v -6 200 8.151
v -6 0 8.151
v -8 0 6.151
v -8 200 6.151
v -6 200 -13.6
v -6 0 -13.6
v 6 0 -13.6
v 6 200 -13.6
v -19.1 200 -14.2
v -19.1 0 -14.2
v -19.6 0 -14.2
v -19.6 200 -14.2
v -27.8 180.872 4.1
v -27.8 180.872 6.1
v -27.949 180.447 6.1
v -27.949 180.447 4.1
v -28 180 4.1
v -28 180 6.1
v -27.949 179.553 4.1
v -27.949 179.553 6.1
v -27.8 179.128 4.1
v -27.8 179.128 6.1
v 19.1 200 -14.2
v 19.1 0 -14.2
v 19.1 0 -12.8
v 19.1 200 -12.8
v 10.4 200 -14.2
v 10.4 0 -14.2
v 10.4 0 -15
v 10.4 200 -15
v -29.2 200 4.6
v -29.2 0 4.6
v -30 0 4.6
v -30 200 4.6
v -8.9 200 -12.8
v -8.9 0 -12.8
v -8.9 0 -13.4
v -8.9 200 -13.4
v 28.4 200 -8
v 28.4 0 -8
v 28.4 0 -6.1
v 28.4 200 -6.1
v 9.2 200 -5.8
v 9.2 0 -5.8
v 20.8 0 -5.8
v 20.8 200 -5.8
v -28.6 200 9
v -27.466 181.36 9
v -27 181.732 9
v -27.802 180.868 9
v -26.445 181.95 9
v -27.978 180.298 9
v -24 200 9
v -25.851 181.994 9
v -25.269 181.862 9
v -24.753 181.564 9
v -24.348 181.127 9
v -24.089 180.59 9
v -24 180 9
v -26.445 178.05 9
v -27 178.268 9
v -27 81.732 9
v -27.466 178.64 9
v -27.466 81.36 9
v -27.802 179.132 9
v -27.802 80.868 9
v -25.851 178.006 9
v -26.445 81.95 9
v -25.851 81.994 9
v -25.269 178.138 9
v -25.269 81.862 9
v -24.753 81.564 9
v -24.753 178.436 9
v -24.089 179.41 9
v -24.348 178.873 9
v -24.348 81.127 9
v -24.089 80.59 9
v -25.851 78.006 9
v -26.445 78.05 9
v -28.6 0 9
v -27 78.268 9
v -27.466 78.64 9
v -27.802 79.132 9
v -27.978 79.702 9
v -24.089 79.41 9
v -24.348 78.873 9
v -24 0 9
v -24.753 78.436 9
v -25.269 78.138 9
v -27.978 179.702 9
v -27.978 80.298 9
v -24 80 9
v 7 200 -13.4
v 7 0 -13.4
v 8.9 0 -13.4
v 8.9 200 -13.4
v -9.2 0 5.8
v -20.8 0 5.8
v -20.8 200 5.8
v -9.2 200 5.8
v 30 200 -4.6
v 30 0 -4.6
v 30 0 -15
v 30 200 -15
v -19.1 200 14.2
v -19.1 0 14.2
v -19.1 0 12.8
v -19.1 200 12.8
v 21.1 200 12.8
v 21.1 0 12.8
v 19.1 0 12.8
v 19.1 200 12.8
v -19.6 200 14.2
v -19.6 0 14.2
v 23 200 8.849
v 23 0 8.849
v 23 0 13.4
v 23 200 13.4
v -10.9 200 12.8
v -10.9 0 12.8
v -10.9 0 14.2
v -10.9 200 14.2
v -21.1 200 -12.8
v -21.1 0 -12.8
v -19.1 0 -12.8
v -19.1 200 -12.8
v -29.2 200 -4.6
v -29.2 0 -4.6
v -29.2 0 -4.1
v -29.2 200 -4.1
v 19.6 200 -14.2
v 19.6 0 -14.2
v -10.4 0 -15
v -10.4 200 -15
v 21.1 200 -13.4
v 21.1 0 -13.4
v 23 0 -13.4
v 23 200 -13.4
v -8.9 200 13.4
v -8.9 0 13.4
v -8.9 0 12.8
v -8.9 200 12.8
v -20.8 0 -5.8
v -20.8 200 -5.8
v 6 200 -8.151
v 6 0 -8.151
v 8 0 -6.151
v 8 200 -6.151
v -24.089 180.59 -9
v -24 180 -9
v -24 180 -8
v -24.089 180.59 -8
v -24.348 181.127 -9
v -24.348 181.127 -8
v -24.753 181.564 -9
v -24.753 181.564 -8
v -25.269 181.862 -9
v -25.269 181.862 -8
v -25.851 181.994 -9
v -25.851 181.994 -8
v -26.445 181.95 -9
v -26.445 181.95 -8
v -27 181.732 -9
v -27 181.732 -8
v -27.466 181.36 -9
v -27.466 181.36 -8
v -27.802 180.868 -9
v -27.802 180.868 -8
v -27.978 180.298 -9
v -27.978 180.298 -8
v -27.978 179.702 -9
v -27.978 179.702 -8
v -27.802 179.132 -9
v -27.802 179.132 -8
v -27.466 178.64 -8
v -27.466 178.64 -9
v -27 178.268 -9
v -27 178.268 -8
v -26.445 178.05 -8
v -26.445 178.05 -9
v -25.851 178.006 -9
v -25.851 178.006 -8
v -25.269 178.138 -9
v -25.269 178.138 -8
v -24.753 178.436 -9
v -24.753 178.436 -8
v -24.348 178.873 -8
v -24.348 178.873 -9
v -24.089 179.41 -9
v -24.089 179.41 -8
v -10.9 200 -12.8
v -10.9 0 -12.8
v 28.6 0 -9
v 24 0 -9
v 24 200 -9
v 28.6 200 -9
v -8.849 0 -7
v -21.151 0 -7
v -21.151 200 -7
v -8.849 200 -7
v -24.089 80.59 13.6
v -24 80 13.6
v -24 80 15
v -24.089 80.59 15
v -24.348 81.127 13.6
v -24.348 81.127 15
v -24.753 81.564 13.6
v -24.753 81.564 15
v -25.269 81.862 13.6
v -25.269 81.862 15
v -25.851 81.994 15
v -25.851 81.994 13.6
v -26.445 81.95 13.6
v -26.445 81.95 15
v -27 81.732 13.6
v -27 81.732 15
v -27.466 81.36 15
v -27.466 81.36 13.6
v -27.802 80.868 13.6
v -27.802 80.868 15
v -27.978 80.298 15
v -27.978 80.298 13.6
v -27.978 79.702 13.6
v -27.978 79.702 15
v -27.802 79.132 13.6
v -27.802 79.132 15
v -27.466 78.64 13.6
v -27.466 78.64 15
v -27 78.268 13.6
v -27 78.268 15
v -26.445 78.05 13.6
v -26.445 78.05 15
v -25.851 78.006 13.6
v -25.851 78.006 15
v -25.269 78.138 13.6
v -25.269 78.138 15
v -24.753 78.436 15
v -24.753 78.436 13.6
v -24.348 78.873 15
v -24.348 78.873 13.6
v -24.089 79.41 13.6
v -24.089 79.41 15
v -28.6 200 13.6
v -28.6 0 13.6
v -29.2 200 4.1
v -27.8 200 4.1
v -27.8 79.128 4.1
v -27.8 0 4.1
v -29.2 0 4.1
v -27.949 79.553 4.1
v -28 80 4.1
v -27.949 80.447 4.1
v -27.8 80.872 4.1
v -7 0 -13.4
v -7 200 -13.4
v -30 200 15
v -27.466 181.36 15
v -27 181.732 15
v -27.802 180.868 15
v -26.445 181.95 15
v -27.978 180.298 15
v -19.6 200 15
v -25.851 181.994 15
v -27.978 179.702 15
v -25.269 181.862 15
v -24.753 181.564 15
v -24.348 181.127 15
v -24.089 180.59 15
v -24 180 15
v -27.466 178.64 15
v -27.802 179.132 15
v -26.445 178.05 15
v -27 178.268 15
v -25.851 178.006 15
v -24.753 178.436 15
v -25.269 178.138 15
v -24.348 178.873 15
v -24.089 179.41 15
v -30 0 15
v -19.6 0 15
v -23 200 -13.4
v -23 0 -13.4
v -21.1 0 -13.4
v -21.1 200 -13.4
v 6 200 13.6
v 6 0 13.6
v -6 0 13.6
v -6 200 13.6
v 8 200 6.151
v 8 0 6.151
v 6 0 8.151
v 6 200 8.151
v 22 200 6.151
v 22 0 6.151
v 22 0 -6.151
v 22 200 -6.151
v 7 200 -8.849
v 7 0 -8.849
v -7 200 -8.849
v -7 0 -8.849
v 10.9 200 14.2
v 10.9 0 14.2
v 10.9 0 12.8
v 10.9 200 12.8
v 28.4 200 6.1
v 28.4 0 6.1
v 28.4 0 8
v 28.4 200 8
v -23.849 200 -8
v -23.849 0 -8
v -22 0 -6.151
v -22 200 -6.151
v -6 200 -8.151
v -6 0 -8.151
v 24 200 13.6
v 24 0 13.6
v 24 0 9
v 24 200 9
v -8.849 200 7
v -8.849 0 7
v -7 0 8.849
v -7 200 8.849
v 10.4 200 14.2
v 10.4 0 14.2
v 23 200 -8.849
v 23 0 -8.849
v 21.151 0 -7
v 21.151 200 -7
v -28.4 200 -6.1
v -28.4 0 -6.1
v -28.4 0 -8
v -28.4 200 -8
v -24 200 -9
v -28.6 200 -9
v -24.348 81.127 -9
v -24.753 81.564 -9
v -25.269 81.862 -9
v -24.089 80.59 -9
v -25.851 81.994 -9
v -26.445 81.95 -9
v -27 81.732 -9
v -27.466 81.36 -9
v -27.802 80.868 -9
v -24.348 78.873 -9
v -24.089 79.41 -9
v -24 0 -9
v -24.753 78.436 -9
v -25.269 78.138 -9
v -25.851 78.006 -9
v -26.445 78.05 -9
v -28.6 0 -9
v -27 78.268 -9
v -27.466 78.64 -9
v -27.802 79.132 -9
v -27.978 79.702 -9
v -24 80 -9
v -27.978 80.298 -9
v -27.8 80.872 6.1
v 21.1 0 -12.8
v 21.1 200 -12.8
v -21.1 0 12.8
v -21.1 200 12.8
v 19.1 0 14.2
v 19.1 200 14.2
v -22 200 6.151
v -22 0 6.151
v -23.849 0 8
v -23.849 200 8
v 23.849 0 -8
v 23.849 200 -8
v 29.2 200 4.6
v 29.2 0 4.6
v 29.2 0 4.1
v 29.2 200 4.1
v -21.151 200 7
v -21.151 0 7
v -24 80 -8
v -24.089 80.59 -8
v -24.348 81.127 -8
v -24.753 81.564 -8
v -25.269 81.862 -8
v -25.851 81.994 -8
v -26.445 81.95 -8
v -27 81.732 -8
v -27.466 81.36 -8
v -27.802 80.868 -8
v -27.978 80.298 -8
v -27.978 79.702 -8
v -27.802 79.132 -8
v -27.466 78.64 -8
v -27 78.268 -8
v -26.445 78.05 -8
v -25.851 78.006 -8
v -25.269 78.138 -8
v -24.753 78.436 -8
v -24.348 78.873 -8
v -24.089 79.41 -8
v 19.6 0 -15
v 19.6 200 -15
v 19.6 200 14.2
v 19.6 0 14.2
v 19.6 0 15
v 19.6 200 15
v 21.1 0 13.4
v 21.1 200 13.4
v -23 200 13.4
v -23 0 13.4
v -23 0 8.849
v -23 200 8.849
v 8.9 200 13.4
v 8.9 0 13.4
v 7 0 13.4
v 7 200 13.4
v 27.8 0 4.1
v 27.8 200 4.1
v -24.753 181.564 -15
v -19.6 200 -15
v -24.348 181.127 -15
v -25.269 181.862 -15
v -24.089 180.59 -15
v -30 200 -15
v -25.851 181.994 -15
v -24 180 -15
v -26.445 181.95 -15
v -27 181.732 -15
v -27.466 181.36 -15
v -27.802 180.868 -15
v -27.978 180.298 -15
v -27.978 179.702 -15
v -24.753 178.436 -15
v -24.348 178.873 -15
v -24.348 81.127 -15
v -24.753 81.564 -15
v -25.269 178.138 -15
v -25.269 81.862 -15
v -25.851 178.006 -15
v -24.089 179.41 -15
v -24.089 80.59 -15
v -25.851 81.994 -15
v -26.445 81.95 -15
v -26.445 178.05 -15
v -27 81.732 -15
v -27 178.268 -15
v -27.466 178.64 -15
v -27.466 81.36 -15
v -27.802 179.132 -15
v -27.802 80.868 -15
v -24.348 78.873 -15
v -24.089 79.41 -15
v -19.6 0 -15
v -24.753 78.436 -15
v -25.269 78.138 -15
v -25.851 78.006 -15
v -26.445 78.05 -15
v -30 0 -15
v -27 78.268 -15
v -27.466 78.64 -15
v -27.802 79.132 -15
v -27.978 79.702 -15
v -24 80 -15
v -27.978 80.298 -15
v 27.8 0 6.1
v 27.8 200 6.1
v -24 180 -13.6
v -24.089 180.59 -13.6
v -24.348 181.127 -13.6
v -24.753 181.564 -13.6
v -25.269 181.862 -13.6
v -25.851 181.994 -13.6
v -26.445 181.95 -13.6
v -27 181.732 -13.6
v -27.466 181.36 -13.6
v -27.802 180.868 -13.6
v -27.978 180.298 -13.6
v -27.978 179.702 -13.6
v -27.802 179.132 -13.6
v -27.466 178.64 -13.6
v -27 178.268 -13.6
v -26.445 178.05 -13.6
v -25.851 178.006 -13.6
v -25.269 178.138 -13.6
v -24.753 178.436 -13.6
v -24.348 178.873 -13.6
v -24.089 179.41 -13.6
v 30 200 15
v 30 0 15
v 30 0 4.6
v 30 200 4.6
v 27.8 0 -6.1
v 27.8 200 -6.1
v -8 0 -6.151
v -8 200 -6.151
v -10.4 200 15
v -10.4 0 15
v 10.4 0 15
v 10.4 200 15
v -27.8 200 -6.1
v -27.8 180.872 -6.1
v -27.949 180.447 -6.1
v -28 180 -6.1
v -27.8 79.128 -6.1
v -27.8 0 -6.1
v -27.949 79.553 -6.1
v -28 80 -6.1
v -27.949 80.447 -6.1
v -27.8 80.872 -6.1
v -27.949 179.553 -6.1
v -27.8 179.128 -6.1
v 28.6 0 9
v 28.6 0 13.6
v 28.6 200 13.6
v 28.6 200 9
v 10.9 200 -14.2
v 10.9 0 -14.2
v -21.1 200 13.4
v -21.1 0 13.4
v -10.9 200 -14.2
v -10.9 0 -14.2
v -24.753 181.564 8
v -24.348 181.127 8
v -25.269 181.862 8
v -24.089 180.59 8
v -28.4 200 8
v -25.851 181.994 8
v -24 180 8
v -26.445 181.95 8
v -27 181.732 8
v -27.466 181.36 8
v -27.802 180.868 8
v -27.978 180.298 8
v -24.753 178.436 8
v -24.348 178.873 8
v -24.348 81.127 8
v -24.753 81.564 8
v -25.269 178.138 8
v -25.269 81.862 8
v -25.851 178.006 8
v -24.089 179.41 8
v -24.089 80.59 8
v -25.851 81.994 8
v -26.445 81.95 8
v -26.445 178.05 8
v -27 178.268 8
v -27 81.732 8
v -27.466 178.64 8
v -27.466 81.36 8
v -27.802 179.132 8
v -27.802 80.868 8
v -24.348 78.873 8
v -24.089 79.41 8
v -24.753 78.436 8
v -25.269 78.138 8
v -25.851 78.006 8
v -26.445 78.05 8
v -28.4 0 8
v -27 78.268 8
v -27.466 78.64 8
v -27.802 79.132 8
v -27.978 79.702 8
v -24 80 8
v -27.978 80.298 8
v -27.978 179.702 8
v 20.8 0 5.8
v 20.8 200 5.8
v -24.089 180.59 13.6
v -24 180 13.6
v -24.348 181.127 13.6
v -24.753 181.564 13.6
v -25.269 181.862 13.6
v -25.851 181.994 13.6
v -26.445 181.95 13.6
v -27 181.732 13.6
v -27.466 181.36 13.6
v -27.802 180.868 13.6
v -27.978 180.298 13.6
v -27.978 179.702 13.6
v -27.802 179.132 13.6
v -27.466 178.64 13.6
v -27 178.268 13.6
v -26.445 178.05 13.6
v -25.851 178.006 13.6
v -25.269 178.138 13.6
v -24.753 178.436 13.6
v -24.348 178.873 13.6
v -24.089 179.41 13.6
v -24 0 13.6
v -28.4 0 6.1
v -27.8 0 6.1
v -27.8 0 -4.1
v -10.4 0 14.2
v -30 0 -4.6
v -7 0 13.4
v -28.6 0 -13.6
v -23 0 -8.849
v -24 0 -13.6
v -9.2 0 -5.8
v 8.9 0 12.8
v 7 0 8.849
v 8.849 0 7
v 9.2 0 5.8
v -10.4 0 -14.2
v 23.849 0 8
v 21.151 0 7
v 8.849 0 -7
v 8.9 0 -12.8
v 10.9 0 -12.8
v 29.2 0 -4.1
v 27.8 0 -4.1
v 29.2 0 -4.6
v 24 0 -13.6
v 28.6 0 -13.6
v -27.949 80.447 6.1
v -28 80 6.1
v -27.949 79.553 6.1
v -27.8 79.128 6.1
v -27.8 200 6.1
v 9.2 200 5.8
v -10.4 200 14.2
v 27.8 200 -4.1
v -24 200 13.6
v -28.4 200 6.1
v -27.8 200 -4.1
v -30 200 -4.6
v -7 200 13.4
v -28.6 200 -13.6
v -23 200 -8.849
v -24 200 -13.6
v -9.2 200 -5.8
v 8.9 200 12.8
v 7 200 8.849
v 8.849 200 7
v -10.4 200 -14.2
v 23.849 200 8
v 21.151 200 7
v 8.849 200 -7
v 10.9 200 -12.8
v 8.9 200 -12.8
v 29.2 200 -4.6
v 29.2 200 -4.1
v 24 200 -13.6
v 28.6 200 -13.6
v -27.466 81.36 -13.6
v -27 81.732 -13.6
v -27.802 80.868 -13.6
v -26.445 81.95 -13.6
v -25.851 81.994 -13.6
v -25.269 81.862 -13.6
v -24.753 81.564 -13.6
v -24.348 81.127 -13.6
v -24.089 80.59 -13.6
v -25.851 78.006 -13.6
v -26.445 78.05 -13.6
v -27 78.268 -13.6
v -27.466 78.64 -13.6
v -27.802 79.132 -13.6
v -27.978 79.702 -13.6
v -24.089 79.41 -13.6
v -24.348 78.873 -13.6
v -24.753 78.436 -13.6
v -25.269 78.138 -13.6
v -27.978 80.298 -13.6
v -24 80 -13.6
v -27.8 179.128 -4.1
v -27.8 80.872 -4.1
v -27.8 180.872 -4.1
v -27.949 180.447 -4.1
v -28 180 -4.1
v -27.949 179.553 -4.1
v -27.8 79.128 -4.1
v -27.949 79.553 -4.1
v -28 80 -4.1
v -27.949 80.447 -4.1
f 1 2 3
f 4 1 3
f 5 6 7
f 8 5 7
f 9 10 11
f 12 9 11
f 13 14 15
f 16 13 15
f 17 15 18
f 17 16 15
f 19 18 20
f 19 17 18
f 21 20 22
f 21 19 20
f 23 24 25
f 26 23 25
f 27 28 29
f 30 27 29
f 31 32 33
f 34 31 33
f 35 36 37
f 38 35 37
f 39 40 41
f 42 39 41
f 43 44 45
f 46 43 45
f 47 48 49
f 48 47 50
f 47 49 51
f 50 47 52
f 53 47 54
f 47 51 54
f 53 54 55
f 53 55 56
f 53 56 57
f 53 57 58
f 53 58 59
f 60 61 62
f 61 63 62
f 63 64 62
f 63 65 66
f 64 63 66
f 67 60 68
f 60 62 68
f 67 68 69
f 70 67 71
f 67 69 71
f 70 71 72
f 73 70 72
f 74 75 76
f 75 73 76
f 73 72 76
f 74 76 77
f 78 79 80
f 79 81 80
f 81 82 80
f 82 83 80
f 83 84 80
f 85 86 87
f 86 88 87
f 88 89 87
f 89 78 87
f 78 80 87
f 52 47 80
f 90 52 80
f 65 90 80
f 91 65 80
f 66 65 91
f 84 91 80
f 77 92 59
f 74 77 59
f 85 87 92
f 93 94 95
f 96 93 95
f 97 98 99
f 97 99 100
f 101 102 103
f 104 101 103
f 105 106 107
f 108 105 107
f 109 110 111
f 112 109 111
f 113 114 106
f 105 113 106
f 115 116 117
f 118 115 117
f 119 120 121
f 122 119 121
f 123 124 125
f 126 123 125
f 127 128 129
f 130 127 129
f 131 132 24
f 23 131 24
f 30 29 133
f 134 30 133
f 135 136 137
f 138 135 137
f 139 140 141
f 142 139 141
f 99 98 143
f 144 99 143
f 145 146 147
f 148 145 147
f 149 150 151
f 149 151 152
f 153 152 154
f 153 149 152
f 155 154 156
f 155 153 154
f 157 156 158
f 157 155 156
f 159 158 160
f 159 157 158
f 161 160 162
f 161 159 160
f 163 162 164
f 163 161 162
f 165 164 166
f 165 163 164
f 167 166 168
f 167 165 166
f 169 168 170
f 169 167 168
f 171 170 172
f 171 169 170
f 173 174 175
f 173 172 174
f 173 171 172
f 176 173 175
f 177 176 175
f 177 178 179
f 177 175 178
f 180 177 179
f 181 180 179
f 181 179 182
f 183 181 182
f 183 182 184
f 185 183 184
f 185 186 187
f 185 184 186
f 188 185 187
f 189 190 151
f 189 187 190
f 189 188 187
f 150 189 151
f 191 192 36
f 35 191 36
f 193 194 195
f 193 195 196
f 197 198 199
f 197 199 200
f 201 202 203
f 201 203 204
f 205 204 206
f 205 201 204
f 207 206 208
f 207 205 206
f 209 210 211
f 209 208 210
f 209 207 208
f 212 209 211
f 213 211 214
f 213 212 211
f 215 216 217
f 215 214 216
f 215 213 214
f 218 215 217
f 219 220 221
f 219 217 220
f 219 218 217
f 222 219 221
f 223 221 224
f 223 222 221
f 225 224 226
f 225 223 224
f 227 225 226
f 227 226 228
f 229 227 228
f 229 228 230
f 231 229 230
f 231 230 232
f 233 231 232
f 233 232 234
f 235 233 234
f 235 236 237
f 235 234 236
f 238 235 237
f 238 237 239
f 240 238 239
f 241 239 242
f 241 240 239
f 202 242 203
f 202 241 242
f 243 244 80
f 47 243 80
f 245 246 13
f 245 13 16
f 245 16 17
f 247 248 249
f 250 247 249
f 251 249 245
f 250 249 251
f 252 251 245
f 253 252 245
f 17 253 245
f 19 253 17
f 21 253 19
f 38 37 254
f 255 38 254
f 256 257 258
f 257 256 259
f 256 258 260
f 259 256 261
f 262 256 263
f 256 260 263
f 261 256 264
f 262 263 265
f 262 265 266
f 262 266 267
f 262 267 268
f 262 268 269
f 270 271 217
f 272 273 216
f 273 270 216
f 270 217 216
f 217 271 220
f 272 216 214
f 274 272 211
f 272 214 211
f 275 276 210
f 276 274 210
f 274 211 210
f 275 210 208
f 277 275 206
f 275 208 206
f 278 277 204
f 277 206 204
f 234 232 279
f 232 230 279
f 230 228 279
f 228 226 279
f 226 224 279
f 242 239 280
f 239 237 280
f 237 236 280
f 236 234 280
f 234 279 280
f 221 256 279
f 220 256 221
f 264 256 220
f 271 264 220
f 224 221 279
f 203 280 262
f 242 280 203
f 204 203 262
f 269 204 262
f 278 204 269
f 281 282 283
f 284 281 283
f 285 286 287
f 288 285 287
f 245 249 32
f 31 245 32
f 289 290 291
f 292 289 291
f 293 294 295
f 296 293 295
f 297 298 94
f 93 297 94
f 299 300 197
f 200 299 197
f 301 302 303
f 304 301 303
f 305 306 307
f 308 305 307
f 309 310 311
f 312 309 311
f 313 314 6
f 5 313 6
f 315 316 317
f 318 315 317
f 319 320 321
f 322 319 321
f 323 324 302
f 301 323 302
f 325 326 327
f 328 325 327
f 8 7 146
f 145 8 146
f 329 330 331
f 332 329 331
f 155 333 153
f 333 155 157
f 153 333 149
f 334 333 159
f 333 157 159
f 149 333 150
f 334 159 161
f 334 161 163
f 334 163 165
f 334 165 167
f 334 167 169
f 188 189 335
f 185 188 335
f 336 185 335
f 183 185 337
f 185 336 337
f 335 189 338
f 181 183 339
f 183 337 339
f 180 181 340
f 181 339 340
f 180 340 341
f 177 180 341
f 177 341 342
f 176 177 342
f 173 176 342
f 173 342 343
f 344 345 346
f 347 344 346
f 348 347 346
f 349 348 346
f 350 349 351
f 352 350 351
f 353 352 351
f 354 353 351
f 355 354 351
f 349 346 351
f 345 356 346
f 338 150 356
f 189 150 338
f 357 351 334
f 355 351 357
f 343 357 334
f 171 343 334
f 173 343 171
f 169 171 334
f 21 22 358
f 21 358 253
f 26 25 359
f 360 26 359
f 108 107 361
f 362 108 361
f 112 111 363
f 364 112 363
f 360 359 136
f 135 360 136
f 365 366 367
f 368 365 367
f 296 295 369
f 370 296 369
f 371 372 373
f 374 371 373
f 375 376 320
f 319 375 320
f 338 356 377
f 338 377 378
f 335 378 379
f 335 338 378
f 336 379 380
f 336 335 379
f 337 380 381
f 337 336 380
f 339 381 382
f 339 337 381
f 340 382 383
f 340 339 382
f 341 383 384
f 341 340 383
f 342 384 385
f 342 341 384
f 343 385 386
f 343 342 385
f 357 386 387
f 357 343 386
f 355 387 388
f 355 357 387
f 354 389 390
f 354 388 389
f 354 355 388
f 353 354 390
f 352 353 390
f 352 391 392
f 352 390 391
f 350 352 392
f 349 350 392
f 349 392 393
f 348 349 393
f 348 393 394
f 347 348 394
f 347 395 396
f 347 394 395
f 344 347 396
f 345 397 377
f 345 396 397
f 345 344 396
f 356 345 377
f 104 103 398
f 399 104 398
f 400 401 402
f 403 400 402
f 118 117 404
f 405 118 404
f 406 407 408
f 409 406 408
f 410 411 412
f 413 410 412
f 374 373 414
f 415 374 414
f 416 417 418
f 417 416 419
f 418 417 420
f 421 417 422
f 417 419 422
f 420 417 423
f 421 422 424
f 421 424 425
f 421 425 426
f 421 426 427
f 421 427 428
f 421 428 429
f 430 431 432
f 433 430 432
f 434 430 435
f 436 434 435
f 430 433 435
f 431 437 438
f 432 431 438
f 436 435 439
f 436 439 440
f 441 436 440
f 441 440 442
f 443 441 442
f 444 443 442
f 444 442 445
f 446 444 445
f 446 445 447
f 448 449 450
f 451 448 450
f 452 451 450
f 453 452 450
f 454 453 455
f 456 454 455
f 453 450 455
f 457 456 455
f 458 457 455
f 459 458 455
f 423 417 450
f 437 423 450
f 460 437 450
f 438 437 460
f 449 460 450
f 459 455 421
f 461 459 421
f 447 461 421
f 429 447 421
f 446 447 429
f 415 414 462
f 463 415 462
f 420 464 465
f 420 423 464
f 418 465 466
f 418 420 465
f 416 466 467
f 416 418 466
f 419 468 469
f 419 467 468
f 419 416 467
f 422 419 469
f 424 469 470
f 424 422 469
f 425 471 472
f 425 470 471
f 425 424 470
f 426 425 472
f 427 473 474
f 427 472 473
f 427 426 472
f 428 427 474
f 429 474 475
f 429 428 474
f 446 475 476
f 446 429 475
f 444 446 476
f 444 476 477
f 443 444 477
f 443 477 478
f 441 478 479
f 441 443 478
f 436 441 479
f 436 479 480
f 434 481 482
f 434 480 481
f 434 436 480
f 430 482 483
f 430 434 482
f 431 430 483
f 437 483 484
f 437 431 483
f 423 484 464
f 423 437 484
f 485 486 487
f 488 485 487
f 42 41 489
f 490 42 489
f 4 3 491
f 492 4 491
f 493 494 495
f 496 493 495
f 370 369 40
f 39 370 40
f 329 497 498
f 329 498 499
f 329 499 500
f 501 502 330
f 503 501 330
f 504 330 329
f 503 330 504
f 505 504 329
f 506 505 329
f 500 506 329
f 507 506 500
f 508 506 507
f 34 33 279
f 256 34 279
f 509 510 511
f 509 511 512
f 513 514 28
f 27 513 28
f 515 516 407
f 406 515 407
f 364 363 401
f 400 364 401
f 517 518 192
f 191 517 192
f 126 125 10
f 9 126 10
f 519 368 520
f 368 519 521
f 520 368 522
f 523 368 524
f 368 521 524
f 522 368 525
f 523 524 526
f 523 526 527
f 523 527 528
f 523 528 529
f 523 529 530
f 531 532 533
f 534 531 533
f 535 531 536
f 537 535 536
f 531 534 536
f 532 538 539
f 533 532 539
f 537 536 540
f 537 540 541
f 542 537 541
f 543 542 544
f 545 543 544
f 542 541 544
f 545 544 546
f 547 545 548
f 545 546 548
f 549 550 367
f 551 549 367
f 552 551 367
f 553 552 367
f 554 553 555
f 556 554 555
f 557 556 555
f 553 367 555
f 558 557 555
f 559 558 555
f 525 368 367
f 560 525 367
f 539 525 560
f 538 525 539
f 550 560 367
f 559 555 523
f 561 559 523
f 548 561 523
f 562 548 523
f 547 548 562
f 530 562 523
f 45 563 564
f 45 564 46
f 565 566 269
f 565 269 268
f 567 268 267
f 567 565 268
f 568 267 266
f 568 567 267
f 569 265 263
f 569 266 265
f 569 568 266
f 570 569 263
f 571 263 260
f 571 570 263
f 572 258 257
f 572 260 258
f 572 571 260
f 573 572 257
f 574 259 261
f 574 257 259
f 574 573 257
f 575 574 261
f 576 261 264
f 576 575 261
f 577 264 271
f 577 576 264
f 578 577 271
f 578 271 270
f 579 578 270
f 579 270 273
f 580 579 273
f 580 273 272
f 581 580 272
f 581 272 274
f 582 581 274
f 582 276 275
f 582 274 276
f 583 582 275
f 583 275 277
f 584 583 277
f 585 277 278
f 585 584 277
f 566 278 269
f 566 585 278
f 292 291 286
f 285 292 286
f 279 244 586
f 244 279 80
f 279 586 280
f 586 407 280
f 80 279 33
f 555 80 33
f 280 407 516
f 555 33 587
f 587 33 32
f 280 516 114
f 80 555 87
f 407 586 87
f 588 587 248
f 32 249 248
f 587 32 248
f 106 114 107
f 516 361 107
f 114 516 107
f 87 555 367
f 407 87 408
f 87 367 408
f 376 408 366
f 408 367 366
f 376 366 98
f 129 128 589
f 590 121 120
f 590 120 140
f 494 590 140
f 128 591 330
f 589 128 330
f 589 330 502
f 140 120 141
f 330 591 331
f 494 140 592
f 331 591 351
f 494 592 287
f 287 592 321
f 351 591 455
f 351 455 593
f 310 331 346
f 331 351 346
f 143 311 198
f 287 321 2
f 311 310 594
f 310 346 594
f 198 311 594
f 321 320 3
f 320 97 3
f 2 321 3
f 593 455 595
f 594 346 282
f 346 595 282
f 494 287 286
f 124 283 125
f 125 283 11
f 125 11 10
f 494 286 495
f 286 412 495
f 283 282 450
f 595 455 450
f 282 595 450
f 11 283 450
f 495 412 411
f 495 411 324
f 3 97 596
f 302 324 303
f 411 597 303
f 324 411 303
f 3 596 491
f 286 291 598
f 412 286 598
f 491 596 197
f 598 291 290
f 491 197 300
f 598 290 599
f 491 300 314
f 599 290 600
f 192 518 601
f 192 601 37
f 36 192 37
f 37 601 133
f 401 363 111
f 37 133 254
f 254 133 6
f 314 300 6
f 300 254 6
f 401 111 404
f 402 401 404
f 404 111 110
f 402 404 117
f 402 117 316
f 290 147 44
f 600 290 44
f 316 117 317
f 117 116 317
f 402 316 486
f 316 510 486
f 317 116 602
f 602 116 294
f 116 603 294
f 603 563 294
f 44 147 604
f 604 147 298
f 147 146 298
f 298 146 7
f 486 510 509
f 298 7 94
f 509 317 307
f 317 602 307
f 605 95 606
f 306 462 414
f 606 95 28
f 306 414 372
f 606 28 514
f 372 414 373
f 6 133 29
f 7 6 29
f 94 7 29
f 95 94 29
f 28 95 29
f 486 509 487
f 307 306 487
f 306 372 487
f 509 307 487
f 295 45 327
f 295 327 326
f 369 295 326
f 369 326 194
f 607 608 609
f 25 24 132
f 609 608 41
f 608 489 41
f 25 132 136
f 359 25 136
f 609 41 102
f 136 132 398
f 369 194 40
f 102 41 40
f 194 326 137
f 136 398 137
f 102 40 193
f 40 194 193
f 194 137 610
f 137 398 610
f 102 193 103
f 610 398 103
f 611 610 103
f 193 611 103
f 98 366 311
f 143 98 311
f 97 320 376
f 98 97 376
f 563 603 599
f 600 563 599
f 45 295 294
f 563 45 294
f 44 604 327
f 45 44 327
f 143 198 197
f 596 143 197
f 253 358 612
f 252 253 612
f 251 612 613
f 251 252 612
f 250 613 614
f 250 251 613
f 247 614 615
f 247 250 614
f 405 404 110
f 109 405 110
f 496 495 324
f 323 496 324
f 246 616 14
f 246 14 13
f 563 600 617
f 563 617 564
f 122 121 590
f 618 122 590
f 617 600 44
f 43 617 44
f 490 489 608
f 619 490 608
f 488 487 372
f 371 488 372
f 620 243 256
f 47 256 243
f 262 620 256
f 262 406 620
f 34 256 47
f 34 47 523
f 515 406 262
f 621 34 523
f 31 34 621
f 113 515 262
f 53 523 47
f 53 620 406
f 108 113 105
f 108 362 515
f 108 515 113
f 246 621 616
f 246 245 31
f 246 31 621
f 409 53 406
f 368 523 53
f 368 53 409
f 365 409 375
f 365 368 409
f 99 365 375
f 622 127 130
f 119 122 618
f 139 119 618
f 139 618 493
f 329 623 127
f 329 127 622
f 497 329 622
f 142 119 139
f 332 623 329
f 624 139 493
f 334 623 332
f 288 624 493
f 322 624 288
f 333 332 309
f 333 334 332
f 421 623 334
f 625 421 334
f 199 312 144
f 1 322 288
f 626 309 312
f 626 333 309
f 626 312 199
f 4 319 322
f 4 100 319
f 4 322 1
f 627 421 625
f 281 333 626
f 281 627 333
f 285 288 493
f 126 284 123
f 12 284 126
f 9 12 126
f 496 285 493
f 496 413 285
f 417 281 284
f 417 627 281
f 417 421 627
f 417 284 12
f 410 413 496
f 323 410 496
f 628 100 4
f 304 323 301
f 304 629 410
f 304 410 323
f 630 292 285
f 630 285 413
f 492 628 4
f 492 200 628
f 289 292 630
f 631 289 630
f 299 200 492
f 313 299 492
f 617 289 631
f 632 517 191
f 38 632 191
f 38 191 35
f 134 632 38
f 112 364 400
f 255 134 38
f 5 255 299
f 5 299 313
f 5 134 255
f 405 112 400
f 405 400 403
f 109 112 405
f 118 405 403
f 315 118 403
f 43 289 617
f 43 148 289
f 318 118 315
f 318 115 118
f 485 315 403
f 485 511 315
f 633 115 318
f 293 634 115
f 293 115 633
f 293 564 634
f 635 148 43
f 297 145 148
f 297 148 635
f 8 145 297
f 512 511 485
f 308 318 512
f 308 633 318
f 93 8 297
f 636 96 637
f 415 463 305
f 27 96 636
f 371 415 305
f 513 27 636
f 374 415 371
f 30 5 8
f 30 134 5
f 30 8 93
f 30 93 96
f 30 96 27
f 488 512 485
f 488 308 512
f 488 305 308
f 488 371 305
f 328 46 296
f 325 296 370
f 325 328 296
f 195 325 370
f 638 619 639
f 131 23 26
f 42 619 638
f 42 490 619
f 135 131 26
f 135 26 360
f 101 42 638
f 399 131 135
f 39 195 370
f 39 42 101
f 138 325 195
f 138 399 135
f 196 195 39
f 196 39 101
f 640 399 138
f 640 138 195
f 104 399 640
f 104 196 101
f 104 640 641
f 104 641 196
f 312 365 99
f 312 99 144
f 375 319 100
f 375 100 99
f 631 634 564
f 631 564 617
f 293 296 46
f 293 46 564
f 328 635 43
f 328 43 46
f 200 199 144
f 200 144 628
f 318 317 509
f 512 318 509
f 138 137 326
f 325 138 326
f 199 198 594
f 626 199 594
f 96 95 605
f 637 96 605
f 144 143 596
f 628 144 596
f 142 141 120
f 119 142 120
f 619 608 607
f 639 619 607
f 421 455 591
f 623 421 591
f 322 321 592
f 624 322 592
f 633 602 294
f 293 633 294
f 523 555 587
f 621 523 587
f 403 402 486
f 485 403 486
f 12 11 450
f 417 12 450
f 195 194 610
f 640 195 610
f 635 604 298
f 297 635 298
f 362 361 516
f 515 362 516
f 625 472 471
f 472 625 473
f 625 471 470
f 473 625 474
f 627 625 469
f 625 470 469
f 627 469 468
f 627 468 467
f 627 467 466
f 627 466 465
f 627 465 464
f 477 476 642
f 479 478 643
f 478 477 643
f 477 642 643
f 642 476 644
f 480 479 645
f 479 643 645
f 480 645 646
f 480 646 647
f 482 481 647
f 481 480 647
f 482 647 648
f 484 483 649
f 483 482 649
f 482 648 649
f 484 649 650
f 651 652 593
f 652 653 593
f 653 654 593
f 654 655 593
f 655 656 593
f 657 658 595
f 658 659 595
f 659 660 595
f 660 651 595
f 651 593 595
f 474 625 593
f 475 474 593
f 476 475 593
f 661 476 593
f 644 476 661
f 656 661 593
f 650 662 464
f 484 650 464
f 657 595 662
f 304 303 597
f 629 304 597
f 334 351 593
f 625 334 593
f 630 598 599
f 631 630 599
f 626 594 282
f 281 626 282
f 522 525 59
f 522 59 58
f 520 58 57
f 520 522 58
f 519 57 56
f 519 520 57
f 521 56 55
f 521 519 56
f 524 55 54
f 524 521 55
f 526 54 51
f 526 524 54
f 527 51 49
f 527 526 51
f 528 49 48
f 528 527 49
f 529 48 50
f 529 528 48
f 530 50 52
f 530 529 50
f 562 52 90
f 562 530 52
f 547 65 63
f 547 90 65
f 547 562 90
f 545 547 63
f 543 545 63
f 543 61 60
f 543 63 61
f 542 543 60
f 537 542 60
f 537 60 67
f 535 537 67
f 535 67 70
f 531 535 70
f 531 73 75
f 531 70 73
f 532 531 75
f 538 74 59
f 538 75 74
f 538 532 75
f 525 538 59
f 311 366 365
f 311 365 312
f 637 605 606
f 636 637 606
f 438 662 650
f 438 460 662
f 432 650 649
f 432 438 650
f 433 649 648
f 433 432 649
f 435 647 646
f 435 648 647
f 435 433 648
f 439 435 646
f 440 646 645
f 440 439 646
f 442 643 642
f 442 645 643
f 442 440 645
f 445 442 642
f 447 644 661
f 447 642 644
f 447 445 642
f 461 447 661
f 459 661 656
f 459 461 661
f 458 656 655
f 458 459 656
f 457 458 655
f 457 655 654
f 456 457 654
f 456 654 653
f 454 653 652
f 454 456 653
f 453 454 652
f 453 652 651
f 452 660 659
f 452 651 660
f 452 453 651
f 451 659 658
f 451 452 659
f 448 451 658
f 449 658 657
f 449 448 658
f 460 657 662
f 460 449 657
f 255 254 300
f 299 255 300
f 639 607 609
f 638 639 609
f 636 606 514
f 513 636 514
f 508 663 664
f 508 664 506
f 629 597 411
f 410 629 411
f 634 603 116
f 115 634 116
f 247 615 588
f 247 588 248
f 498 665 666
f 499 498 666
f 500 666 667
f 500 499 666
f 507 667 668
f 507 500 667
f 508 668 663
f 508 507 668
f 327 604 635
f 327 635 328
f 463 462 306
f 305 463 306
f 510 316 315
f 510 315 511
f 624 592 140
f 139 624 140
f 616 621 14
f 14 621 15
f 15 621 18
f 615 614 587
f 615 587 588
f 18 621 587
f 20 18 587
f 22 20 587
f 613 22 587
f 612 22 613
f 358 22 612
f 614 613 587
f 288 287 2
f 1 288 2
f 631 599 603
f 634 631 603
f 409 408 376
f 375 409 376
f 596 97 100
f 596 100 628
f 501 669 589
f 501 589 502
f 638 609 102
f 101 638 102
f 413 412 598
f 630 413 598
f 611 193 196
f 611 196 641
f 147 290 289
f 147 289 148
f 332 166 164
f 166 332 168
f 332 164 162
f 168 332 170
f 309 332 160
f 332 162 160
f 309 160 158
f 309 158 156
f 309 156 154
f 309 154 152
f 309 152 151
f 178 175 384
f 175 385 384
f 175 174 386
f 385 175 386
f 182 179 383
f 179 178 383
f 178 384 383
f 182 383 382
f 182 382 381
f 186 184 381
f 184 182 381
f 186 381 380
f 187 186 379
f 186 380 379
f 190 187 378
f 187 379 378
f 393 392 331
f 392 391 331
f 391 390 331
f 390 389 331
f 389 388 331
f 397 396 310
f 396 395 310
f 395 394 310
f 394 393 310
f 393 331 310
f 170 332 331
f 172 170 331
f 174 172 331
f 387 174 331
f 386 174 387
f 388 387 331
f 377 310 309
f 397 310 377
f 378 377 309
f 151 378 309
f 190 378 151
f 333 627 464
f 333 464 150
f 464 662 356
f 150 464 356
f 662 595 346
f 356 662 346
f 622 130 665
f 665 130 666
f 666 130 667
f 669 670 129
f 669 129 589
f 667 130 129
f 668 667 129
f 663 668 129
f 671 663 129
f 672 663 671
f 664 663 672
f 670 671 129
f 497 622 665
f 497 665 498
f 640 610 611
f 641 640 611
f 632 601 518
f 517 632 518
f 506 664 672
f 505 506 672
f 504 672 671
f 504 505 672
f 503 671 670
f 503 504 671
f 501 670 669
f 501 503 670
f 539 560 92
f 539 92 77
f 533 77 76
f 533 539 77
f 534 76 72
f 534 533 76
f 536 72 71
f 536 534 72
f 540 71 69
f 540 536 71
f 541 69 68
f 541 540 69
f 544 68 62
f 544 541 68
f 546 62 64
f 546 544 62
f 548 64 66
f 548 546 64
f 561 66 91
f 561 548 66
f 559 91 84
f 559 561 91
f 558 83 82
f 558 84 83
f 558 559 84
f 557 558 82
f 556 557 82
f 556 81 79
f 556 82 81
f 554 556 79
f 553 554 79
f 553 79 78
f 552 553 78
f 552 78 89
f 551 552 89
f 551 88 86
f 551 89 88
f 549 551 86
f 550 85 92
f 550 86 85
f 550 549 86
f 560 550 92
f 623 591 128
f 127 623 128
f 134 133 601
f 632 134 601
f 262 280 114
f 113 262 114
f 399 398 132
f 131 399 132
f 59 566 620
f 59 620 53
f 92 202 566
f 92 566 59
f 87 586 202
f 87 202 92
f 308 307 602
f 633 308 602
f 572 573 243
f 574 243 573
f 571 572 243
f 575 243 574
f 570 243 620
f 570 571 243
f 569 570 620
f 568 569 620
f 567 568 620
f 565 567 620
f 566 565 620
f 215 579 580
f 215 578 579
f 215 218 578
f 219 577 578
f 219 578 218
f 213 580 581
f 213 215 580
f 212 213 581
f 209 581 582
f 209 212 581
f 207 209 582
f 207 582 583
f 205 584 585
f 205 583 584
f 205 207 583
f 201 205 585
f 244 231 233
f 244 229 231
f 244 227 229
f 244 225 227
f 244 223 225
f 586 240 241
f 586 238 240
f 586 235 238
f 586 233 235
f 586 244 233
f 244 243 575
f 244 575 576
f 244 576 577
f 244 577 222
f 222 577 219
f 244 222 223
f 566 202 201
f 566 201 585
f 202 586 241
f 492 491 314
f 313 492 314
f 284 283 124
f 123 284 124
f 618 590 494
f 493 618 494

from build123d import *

# Parameters (mm, degrees)
SKETCH_1_W               = 14
SKETCH_1_H               = 14
SKETCH_1_W_2             = 11.6
SKETCH_1_H_2             = 11.6
SKETCH_1_W_3             = 4.6
SKETCH_1_H_3             = 4.6
EXTRUDE_2_DEPTH          = 200
CUT_EXTRUDE_1_DEPTH      = 203.792997907
CUT_EXTRUDE_1_DEPTH_BACK = 203.792997907
SKETCH_2_R               = 2


with BuildPart() as part:
    # Эскиз1 → Бобышка-Вытянуть2 (new body)
    # profile 1 of 9: a face of its own
    with BuildSketch(Plane(origin=(0, 0, 0), x_dir=(1, 0, 0), z_dir=(0, 1, 0))):
        Polygon((8, -7), (8, -6.151471863), (6, -8.151471863), (6, -13.6), (-6, -13.6), (-6, -8.151471863), (-8, -6.151471863), (-8, -7), (-8.848528137, -7), (-7, -8.848528137), (-7, -13.4), (-8.9, -13.4), (-8.9, -12.8), (-10.9, -12.8), (-10.9, -14.2), (-10.4, -14.2), (-10.4, -15), (10.4, -15), (10.4, -14.2), (10.9, -14.2), (10.9, -12.8), (8.9, -12.8), (8.9, -13.4), (7, -13.4), (7, -8.848528137), (8.848528137, -7), align=None)
    # profile 2 of 9: a face of its own
    with BuildSketch(Plane(origin=(0, 0, 0), x_dir=(1, 0, 0), z_dir=(0, 1, 0))):
        with Locations((-15, 0)):
            Rectangle(SKETCH_1_W, SKETCH_1_H)
        with Locations((-15, 0)):
            Rectangle(SKETCH_1_W_2, SKETCH_1_H_2, mode=Mode.SUBTRACT)
    # profile 3 of 9: a face of its own
    with BuildSketch(Plane(origin=(0, 0, 0), x_dir=(1, 0, 0), z_dir=(0, 1, 0))):
        Polygon((-23, -8.848528137), (-21.151471863, -7), (-22, -7), (-22, -6.151471863), (-23.848528137, -8), (-28.4, -8), (-28.4, -6.1), (-27.8, -6.1), (-27.8, -4.1), (-29.2, -4.1), (-29.2, -4.6), (-30, -4.6), (-30, -15), (-19.6, -15), (-19.6, -14.2), (-19.1, -14.2), (-19.1, -12.8), (-21.1, -12.8), (-21.1, -13.4), (-23, -13.4), align=None)
        with Locations((-26.3, -11.3)):
            Rectangle(SKETCH_1_W_3, SKETCH_1_H_3, mode=Mode.SUBTRACT)
    # profile 4 of 9: a face of its own
    with BuildSketch(Plane(origin=(0, 0, 0), x_dir=(1, 0, 0), z_dir=(0, 1, 0))):
        with Locations((15, 0)):
            Rectangle(SKETCH_1_W, SKETCH_1_H)
        with Locations((15, 0)):
            Rectangle(SKETCH_1_W_2, SKETCH_1_H_2, mode=Mode.SUBTRACT)
    # profile 5 of 9: a face of its own
    with BuildSketch(Plane(origin=(0, 0, 0), x_dir=(1, 0, 0), z_dir=(0, 1, 0))):
        Polygon((23.848528137, -8), (22, -6.151471863), (22, -7), (21.151471863, -7), (23, -8.848528137), (23, -13.4), (21.1, -13.4), (21.1, -12.8), (19.1, -12.8), (19.1, -14.2), (19.6, -14.2), (19.6, -15), (30, -15), (30, -4.6), (29.2, -4.6), (29.2, -4.1), (27.8, -4.1), (27.8, -6.1), (28.4, -6.1), (28.4, -8), align=None)
        with Locations((26.3, -11.3)):
            Rectangle(SKETCH_1_W_3, SKETCH_1_H_3, mode=Mode.SUBTRACT)
    # profile 6 of 9: a face of its own
    with BuildSketch(Plane(origin=(0, 0, 0), x_dir=(1, 0, 0), z_dir=(0, 1, 0))):
        Polygon((21.151471863, 7), (22, 7), (22, 6.151471863), (23.848528137, 8), (28.4, 8), (28.4, 6.1), (27.8, 6.1), (27.8, 4.1), (29.2, 4.1), (29.2, 4.6), (30, 4.6), (30, 15), (19.6, 15), (19.6, 14.2), (19.1, 14.2), (19.1, 12.8), (21.1, 12.8), (21.1, 13.4), (23, 13.4), (23, 8.848528137), align=None)
        with Locations((26.3, 11.3)):
            Rectangle(SKETCH_1_W_3, SKETCH_1_H_3, mode=Mode.SUBTRACT)
    # profile 7 of 9: a face of its own
    with BuildSketch(Plane(origin=(0, 0, 0), x_dir=(1, 0, 0), z_dir=(0, 1, 0))):
        Polygon((8, 7), (8.848528137, 7), (7, 8.848528137), (7, 13.4), (8.9, 13.4), (8.9, 12.8), (10.9, 12.8), (10.9, 14.2), (10.4, 14.2), (10.4, 15), (-10.4, 15), (-10.4, 14.2), (-10.9, 14.2), (-10.9, 12.8), (-8.9, 12.8), (-8.9, 13.4), (-7, 13.4), (-7, 8.848528137), (-8.848528137, 7), (-8, 7), (-8, 6.151471863), (-6, 8.151471863), (-6, 13.6), (6, 13.6), (6, 8.151471863), (8, 6.151471863), align=None)
    # profile 8 of 9: a face of its own
    with BuildSketch(Plane(origin=(0, 0, 0), x_dir=(1, 0, 0), z_dir=(0, 1, 0))):
        Polygon((-22, 7), (-21.151471863, 7), (-23, 8.848528137), (-23, 13.4), (-21.1, 13.4), (-21.1, 12.8), (-19.1, 12.8), (-19.1, 14.2), (-19.6, 14.2), (-19.6, 15), (-30, 15), (-30, 13.6), (-28.6, 13.6), (-24, 13.6), (-24, 9), (-24, 8.151471863), (-23.848528137, 8), (-22, 6.151471863), align=None)
    # profile 9 of 9: a face of its own
    with BuildSketch(Plane(origin=(0, 0, 0), x_dir=(1, 0, 0), z_dir=(0, 1, 0))):
        Polygon((-28.6, 13.6), (-30, 13.6), (-30, 4.6), (-29.2, 4.6), (-29.2, 4.1), (-27.8, 4.1), (-27.8, 6.1), (-28.4, 6.1), (-28.4, 8), (-23.848528137, 8), (-24, 8.151471863), (-24, 9), (-28.6, 9), align=None)
    extrude(amount=EXTRUDE_2_DEPTH)

    # Эскиз2 → Вырез-Вытянуть1 (cut, two sides: drawn at the far end of the back side and taken through both)
    with BuildSketch(Plane.XY.offset(-CUT_EXTRUDE_1_DEPTH_BACK)):
        with Locations((-26, 180)):
            Circle(SKETCH_2_R)
        with Locations((-26, 80)):
            Circle(SKETCH_2_R)
    extrude(amount=CUT_EXTRUDE_1_DEPTH + CUT_EXTRUDE_1_DEPTH_BACK, mode=Mode.SUBTRACT)


solid = part.part
